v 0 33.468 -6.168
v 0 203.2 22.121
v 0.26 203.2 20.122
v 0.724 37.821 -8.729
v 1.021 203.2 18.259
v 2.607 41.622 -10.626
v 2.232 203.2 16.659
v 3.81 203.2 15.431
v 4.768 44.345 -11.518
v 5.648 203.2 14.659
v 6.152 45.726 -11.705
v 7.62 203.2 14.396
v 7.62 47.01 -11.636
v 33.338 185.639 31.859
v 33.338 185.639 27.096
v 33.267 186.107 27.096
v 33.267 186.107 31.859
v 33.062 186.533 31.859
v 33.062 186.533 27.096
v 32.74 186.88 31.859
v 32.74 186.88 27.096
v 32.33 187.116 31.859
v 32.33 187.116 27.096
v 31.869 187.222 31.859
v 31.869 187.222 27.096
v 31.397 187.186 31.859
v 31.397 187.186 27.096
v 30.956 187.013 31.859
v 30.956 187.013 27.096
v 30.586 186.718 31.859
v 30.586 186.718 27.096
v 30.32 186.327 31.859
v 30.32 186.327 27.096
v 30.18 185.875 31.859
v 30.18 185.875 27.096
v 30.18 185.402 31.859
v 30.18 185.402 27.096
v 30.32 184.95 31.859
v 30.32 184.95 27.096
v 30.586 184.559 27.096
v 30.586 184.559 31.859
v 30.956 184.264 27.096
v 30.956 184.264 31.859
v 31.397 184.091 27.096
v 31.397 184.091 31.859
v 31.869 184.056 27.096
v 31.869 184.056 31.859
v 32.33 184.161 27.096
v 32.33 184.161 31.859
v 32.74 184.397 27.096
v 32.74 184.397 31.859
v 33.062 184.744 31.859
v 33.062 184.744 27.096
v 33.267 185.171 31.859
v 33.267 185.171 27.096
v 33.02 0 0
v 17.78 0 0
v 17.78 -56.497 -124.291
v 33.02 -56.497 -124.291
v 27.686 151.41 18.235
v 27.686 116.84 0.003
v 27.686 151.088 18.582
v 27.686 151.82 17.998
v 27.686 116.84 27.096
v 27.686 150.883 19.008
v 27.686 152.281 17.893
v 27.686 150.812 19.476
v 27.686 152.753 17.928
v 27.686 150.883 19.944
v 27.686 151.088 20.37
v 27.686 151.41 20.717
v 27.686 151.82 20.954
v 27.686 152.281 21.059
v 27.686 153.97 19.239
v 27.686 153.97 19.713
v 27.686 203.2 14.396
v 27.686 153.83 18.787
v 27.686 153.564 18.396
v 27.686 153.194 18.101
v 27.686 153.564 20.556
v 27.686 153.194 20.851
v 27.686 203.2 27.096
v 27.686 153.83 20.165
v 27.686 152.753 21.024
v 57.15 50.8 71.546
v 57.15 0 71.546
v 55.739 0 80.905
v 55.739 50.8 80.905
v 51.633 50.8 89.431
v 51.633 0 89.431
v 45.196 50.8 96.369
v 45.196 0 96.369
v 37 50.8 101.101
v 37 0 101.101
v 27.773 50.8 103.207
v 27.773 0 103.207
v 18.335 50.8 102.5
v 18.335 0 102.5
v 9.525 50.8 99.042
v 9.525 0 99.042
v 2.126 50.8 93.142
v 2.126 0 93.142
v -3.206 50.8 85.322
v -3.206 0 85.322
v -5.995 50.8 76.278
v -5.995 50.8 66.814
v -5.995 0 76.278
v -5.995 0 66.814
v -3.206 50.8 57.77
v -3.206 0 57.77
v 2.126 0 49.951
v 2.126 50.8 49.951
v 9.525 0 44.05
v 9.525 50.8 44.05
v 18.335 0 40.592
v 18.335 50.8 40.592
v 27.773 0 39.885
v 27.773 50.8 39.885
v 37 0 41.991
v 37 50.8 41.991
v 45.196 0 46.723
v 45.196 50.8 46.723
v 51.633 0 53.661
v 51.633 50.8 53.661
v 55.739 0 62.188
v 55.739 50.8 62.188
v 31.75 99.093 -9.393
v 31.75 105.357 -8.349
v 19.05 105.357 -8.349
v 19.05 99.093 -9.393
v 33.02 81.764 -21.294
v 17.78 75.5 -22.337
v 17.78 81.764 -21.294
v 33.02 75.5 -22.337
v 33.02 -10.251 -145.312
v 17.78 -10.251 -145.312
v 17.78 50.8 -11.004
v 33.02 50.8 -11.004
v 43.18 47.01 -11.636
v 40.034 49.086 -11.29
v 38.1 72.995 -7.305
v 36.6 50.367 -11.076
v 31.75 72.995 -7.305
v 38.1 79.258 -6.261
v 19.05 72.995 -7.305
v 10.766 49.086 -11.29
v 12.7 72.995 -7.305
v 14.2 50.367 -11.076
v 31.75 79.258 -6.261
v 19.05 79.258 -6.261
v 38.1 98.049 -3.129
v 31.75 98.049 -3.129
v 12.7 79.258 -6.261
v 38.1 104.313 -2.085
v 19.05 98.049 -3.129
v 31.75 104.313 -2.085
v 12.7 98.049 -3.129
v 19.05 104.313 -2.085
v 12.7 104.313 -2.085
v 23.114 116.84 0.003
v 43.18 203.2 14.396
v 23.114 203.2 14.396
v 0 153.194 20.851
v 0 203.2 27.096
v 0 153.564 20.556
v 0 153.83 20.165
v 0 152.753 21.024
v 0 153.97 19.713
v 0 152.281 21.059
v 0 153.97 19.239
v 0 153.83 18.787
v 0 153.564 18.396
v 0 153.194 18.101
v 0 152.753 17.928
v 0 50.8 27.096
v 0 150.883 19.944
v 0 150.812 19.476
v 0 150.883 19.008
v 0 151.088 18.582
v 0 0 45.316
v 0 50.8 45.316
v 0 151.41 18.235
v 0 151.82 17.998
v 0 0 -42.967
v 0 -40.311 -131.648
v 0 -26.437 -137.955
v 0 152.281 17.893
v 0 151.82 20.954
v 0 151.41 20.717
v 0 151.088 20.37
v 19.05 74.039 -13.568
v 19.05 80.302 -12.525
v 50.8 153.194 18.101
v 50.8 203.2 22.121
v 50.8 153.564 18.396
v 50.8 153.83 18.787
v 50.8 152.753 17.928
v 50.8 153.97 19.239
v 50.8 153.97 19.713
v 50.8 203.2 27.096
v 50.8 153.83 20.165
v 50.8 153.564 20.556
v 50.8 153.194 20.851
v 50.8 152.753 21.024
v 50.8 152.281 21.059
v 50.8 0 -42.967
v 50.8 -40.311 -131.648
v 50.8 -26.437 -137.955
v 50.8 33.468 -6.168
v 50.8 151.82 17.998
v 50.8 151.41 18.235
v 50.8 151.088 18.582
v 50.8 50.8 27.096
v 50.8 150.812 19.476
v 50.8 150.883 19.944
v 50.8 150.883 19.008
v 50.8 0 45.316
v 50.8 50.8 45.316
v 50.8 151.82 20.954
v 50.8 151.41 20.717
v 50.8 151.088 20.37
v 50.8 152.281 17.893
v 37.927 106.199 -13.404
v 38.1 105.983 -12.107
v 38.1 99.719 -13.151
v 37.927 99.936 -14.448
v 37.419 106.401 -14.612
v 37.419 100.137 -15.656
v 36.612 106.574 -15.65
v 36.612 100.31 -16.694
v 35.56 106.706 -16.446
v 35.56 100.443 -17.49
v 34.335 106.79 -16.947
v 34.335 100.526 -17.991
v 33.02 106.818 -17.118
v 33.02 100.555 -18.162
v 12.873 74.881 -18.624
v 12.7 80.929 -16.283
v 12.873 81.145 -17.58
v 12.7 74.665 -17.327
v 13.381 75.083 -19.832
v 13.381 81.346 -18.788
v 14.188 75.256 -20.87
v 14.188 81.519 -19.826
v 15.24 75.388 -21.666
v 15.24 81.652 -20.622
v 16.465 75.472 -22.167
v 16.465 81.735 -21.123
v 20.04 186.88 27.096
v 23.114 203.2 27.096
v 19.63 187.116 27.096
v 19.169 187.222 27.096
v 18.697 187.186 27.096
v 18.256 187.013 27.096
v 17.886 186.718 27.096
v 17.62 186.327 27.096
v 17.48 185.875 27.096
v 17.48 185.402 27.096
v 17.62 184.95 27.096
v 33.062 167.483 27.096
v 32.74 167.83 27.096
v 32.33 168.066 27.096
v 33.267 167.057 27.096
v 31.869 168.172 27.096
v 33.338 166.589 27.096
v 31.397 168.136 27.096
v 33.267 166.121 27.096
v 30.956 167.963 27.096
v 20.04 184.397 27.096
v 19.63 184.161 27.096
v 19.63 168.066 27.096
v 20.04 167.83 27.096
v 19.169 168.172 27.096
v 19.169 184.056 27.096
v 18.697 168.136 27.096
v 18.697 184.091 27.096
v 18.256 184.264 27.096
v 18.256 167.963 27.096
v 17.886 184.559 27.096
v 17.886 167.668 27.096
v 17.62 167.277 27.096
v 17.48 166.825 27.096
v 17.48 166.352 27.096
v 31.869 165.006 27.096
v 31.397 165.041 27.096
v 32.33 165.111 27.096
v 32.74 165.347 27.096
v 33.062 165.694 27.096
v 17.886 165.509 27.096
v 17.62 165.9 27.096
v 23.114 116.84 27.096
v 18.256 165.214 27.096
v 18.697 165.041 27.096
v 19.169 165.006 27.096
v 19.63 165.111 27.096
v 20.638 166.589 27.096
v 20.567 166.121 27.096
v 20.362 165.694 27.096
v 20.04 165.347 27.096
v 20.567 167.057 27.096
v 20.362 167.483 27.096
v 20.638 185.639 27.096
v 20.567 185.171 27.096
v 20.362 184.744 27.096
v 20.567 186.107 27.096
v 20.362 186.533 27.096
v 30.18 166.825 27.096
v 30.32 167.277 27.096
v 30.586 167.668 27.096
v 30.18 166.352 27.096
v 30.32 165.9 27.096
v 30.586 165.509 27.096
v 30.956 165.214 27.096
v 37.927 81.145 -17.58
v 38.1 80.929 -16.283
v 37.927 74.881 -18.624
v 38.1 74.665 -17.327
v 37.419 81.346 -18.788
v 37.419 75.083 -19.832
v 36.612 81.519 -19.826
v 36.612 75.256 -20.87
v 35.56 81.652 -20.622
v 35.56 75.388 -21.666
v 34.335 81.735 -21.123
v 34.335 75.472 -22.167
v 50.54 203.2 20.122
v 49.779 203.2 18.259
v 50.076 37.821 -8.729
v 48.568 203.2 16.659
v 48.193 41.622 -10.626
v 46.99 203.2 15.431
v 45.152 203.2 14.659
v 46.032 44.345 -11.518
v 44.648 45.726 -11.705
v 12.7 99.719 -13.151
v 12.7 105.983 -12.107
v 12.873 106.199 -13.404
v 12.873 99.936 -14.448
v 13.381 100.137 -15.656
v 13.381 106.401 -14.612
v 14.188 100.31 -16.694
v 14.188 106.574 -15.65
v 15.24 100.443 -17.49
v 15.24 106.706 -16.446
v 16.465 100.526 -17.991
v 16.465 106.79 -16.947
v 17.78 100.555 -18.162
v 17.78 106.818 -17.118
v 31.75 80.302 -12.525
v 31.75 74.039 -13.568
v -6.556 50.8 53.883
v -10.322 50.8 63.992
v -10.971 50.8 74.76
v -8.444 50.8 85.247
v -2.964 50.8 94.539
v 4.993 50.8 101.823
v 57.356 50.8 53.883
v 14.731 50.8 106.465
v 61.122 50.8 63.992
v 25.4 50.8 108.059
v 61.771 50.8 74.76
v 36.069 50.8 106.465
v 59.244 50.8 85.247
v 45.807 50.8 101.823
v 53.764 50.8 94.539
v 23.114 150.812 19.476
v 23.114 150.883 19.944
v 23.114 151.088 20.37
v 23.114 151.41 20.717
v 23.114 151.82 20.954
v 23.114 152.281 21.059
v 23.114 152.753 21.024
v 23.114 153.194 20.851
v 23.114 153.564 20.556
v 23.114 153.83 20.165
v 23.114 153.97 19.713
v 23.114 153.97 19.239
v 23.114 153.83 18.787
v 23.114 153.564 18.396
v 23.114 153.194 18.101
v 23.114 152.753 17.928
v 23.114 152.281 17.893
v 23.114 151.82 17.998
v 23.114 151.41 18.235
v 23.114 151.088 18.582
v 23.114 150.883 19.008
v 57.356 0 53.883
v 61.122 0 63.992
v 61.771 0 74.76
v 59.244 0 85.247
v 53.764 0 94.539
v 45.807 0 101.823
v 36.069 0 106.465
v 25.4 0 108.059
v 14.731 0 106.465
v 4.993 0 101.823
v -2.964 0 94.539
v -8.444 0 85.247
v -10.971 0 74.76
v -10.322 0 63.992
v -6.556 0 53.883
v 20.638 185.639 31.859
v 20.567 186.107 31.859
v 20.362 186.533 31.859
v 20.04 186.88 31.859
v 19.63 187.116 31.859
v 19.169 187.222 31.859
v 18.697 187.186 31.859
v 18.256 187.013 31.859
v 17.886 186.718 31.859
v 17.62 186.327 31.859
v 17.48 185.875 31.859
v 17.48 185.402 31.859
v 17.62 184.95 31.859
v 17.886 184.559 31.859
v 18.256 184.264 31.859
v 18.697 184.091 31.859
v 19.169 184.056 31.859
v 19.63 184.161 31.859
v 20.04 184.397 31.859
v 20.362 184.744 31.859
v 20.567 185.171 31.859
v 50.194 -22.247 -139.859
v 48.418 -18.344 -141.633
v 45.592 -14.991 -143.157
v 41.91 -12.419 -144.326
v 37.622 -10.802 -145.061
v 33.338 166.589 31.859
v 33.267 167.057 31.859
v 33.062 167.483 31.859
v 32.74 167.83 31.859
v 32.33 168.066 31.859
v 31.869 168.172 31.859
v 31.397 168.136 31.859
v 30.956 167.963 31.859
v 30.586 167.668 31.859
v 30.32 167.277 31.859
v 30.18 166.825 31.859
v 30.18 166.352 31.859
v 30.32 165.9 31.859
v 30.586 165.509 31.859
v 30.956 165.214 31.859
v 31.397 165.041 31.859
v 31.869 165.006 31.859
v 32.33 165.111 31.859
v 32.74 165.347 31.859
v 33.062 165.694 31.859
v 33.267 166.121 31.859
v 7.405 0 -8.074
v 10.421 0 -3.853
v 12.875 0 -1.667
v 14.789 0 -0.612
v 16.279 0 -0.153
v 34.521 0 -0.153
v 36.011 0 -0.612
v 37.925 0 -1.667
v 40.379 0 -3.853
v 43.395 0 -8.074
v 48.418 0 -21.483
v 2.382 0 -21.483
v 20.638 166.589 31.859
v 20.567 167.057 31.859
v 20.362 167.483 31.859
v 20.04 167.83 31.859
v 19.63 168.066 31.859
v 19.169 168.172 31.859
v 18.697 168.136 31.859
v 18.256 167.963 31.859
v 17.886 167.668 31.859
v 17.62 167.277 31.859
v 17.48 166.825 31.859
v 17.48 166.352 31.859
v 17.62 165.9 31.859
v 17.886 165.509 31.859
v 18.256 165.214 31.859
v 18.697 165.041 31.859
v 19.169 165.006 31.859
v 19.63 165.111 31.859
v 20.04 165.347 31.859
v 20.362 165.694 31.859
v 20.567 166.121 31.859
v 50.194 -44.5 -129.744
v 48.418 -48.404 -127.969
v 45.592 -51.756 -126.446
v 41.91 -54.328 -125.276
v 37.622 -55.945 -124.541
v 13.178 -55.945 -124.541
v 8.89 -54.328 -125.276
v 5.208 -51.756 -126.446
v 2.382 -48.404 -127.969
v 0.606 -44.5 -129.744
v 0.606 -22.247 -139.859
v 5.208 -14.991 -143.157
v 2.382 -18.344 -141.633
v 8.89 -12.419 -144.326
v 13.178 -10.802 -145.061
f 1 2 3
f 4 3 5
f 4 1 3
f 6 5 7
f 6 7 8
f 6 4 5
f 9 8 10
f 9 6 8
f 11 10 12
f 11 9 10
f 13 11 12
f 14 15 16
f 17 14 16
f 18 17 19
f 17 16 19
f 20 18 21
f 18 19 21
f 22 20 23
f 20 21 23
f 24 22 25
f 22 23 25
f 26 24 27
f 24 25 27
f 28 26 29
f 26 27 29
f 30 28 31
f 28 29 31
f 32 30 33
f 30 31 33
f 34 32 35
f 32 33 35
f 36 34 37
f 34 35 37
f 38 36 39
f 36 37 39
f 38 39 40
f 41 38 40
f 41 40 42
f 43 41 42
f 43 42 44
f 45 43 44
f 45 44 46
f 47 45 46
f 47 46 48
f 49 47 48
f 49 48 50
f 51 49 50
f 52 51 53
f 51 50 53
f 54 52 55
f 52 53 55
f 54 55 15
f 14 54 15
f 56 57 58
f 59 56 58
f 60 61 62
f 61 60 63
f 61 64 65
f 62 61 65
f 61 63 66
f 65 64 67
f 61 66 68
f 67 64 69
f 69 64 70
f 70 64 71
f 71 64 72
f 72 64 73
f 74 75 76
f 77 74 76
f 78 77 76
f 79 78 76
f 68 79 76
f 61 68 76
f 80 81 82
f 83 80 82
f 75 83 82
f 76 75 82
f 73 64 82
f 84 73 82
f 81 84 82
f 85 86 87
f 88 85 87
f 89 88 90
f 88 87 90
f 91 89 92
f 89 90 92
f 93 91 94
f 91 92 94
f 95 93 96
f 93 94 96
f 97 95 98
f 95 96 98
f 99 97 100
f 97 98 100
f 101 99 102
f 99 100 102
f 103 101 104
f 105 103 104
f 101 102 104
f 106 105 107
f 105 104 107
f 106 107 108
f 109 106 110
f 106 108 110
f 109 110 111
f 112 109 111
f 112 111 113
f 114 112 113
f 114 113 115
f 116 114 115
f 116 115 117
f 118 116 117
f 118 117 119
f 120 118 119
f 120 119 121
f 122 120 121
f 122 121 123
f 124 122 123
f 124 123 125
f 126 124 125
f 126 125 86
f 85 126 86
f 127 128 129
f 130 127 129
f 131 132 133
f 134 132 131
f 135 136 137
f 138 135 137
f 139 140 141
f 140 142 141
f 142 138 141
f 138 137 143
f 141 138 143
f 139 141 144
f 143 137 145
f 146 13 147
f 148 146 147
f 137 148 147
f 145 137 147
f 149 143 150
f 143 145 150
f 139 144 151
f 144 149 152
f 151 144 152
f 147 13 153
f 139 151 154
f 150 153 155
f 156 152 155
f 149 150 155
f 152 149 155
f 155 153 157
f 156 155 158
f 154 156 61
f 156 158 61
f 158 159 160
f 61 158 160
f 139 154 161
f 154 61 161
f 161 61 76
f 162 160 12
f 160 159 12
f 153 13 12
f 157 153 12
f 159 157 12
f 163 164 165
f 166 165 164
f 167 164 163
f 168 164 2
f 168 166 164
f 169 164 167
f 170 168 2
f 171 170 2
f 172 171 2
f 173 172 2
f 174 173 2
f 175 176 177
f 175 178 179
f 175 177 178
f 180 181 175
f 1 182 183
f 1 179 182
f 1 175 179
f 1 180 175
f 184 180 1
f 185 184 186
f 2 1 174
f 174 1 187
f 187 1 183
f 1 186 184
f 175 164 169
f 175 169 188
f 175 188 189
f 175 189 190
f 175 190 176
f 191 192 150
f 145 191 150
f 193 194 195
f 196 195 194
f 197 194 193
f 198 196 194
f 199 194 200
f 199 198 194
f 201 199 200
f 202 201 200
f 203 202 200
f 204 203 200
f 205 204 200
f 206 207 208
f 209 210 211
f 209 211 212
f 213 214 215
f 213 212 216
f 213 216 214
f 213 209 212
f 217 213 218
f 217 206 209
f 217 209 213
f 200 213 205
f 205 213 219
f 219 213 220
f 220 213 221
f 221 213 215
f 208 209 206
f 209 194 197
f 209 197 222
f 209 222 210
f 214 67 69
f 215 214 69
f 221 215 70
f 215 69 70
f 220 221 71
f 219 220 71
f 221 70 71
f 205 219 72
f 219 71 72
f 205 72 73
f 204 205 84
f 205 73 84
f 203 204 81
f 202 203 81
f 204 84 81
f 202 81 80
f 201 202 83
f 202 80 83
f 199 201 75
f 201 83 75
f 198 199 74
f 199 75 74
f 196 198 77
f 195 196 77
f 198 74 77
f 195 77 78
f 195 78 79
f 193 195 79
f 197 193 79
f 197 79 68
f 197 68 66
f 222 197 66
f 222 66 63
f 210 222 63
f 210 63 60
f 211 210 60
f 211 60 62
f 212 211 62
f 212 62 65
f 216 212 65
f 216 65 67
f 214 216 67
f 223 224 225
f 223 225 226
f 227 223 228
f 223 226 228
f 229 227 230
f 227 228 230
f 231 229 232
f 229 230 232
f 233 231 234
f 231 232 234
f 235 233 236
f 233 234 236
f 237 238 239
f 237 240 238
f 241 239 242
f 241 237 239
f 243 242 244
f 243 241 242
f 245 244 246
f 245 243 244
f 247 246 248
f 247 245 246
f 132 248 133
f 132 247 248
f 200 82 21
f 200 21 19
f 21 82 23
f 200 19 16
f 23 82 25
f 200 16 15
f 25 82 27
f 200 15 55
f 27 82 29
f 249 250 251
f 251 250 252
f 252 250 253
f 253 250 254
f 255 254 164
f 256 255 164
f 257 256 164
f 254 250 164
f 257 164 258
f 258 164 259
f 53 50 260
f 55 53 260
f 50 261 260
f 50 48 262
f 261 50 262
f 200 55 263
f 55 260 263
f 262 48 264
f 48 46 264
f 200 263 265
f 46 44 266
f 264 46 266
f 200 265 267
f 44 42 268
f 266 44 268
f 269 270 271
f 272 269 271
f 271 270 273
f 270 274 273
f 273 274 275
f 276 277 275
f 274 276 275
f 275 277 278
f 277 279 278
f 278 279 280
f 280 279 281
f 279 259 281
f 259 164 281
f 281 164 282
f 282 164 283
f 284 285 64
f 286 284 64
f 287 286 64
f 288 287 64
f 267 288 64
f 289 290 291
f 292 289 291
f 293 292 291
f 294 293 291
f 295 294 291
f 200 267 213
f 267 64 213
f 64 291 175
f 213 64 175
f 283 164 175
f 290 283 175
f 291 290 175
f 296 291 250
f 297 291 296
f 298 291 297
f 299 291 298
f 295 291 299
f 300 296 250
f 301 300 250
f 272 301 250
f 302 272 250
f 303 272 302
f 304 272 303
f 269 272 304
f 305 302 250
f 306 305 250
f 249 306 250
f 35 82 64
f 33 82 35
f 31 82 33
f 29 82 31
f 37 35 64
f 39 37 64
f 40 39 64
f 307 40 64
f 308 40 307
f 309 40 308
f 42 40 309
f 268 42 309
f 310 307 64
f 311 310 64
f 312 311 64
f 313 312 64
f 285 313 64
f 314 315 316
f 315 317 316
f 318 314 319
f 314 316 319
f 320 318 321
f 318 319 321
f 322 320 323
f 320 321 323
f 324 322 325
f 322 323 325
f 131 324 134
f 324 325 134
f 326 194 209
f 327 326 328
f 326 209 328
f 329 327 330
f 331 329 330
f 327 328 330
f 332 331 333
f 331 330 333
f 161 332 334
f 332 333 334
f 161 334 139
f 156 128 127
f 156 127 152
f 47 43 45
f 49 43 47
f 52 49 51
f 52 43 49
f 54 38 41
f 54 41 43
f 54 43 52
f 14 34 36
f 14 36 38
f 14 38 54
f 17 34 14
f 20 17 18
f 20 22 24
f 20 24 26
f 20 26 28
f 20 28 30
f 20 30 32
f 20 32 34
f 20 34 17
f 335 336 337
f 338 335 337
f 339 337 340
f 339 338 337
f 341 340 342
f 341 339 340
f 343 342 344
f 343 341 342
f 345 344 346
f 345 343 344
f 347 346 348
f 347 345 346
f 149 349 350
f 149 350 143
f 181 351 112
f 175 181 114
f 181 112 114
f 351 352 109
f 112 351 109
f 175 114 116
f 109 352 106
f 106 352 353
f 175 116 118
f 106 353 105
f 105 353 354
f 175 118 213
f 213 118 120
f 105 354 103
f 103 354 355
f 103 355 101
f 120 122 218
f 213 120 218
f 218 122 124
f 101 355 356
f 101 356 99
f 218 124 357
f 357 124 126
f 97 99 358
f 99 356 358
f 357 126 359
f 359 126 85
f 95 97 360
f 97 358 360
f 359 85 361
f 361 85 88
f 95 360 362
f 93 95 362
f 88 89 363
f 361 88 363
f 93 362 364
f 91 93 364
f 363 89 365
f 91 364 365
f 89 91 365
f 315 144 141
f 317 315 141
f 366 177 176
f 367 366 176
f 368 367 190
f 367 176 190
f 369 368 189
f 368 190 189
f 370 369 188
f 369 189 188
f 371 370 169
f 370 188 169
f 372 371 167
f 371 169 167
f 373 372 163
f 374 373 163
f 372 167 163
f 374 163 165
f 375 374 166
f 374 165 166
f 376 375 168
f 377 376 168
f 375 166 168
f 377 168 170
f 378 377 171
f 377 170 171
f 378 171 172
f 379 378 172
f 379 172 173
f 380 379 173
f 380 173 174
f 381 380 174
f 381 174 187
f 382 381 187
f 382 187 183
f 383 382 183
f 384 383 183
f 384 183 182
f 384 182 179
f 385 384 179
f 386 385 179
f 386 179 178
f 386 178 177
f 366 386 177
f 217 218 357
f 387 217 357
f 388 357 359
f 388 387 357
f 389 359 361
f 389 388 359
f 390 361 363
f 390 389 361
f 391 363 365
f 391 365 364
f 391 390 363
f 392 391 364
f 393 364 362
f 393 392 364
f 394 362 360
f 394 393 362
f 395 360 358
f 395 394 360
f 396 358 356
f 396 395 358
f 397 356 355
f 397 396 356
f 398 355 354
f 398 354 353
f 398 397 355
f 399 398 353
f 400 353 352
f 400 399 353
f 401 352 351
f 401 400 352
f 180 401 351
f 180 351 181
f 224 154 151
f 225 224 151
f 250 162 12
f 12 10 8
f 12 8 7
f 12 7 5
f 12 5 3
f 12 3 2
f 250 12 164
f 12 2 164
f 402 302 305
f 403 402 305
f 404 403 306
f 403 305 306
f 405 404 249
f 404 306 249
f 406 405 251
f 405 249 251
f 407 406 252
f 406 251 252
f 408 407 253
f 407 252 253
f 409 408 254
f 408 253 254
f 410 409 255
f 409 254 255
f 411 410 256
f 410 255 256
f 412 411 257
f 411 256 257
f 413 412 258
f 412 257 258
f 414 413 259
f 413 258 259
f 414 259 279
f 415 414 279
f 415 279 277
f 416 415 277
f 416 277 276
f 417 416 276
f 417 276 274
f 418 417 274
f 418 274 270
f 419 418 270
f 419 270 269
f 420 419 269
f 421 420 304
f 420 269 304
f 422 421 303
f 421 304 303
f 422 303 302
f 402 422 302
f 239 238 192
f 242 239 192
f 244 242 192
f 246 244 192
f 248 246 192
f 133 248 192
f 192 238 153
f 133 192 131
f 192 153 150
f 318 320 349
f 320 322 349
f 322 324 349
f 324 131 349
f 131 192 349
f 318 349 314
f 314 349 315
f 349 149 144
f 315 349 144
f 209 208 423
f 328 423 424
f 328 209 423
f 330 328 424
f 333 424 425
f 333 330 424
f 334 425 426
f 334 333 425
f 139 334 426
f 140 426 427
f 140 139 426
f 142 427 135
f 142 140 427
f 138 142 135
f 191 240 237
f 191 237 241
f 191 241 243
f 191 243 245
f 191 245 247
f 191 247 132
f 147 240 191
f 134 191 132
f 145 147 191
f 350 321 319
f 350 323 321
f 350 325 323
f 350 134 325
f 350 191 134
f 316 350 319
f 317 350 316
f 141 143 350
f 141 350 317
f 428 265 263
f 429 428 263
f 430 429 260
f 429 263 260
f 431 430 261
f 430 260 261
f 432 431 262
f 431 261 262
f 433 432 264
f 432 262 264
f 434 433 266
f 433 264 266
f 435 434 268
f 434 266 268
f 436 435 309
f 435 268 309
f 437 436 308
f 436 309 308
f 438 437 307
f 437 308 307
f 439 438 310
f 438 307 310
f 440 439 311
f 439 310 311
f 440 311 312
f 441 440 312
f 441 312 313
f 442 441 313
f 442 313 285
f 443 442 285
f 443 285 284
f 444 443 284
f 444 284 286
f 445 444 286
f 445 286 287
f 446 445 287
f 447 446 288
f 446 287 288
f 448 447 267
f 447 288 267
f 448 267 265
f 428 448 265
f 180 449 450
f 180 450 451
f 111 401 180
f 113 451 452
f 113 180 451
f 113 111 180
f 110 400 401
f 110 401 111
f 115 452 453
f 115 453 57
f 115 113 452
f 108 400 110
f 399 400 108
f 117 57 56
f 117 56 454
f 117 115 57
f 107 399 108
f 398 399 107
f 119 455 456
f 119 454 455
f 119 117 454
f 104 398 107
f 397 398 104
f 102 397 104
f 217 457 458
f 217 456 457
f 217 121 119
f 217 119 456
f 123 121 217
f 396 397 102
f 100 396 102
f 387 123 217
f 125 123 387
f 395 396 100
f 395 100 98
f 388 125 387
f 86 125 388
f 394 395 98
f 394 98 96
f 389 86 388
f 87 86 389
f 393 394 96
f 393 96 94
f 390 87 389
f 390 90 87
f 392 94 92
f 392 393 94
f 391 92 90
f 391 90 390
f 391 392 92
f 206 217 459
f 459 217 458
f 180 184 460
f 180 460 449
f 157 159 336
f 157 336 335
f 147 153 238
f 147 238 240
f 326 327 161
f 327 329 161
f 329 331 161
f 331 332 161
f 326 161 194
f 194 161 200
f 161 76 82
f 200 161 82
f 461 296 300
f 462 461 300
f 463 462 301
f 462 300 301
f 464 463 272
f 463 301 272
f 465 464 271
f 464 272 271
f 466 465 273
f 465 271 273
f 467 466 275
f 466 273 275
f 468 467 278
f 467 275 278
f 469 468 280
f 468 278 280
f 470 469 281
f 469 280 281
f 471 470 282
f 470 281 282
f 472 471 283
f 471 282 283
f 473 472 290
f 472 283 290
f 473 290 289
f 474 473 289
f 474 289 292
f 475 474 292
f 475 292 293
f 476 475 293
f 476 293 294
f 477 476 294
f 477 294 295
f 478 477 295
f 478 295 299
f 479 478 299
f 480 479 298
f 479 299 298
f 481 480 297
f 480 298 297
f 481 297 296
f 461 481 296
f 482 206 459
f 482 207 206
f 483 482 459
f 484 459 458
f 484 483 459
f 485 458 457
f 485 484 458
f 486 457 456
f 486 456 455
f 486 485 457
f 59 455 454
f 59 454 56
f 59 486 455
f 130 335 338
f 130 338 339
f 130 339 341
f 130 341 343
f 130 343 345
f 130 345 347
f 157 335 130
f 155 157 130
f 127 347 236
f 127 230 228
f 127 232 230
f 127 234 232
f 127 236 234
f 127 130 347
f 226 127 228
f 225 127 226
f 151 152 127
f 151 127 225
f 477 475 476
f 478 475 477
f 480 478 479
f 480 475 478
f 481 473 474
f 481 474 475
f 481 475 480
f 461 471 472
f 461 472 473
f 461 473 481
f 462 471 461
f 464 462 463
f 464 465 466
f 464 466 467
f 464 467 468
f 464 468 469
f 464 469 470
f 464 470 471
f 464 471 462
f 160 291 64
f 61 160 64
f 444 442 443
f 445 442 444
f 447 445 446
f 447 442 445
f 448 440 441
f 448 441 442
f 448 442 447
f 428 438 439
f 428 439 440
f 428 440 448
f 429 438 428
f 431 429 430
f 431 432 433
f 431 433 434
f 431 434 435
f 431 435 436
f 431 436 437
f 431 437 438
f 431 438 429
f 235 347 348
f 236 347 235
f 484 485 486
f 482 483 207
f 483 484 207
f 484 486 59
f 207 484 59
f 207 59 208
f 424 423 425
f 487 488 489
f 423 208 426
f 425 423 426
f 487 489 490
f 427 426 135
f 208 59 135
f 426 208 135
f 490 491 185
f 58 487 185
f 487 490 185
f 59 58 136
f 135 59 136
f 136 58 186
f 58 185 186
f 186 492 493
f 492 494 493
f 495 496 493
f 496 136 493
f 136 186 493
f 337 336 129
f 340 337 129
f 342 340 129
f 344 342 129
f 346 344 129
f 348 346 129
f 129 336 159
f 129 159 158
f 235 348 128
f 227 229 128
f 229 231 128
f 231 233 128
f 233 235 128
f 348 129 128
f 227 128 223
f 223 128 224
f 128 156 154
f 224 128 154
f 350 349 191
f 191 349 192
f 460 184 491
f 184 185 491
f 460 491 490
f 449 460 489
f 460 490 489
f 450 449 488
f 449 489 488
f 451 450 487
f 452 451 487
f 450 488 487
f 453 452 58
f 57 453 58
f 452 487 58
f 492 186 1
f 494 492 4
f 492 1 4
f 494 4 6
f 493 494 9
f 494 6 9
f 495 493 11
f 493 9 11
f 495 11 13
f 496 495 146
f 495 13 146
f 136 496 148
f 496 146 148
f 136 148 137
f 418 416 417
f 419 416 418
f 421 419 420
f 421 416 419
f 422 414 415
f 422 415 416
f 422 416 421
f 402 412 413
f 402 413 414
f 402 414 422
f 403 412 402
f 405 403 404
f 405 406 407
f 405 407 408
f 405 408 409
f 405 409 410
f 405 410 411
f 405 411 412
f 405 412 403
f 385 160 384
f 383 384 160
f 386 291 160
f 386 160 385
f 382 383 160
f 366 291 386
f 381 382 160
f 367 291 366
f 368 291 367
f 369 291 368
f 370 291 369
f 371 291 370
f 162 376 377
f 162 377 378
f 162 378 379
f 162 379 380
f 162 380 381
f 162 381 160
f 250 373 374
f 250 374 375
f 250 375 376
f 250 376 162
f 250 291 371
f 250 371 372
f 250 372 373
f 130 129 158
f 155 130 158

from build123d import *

# Parameters (mm, degrees)
F1_DEPTH  = 50.8
F2_R      = 31.75
F3_DEPTH  = 50.8
F4_R      = 17.78
F5_R      = 7.62
F6_R      = 1.5875
F7_DEPTH  = 4.7625
F8_W      = 4.572
F8_H      = 86.36
F9_DEPTH  = 127
F11_D     = 3.175
F12_W     = 25.4
F12_H     = 6.35
F13_DEPTH = 15.24
F14_R     = 5.08
F15_W     = 12.7
F15_H     = 6.35
F16_DEPTH = 50.8


with BuildPart() as f1:
    # F0 (on Right) → F1 (new body)
    with BuildSketch(Plane.YZ):
        Polygon((0, 39.7960290042), (0, 0), (-56.4969599977, -124.290533917), (-10.2505199437, -145.3121128855), (50.8, -11.0039709958), (203.2, 14.3960290042), (203.2, 27.0960290042), (50.8, 27.0960290042), (50.8, 39.7960290042), align=None)
    extrude(amount=F1_DEPTH)

    # F2 (on face) → F3 (join)
    with BuildSketch(Plane.XZ):
        with BuildLine():
            Line((0, 45.3162242728), (0, 39.7960290042))
            Line((0, 39.7960290042), (7.3694660021, 39.7960290042))
            ThreePointArc((7.3694660021, 39.7960290042), (25.4, 35.0335290042), (43.4305339979, 39.7960290042))
            Line((43.4305339979, 39.7960290042), (50.8, 39.7960290042))
            Line((50.8, 39.7960290042), (50.8, 45.3162242728))
            ThreePointArc((50.8, 45.3162242728), (25.4, 108.0585290042), (0, 45.3162242728))
        make_face()
        with Locations((25.4, 71.5460290042)):
            Circle(F2_R, mode=Mode.SUBTRACT)
    extrude(amount=-F3_DEPTH)

    # F4
    f4_edges = [f1.edges().sort_by_distance(p)[0] for p in [
        (50.8, -28.24848, -62.145267),
        (0, -28.24848, -62.145267),
        (50.8, 20.27474, -78.158042),
        (0, 20.27474, -78.158042),
    ]]
    fillet(f4_edges, radius=F4_R)

    # F5
    f5_edges = [f1.edges().sort_by_distance(p)[0] for p in [
        (50.8, 127, 1.696029),
        (0, 127, 1.696029),
    ]]
    fillet(f5_edges, radius=F5_R)

    # F6 (on face) → F7 (join)
    with BuildSketch(Plane.XY.offset(27.0960290042)):
        with Locations((19.05, 185.6386214495)):
            Circle(F6_R)
        with Locations((31.75, 185.6386214495)):
            Circle(F6_R)
        with Locations((31.75, 166.5886214495)):
            Circle(F6_R)
        with Locations((19.05, 166.5886214495)):
            Circle(F6_R)
    extrude(amount=F7_DEPTH)

    # F8 (on face) → F9 (cut)
    with BuildSketch(Plane.XY.offset(27.0960290042)):
        with Locations((25.4, 160.02)):
            Rectangle(F8_W, F8_H)
    extrude(amount=-F9_DEPTH, mode=Mode.SUBTRACT)

    # F11 (through all)
    with Locations(Plane.YZ.offset(50.8)):
        with Locations((152.4, 19.4760290042)):
            Hole(F11_D / 2)

    # F12 (on face) → F13 (join)
    with BuildSketch(Plane(origin=(0, 3.157400702, -18.9444042121), x_dir=(1, 0, 0), z_dir=(0, 0.1643989873, -0.9863939238))):
        with Locations((25.4, -99.3757092261)):
            Rectangle(F12_W, F12_H)
        with Locations((25.4, -73.9757092261)):
            Rectangle(F12_W, F12_H)
    extrude(amount=F13_DEPTH)

    # F14
    f14_edges = [f1.edges().sort_by_distance(p)[0] for p in [
        (38.1, 103.686437, -17.639782),
        (38.1, 78.632031, -21.815516),
        (12.7, 78.632031, -21.815516),
        (12.7, 103.686437, -17.639782),
    ]]
    fillet(f14_edges, radius=F14_R)

    # F15 (on face) → F16 (cut)
    with BuildSketch(Plane(origin=(0, 101.1553964653, 16.8592327442), x_dir=(-1, 0, 0), z_dir=(0, 0.9863939238, 0.1643989873))):
        with Locations((-25.4, -22.3807186834)):
            Rectangle(F15_W, F15_H)
    extrude(amount=-F16_DEPTH, mode=Mode.SUBTRACT)


solid = f1.part
